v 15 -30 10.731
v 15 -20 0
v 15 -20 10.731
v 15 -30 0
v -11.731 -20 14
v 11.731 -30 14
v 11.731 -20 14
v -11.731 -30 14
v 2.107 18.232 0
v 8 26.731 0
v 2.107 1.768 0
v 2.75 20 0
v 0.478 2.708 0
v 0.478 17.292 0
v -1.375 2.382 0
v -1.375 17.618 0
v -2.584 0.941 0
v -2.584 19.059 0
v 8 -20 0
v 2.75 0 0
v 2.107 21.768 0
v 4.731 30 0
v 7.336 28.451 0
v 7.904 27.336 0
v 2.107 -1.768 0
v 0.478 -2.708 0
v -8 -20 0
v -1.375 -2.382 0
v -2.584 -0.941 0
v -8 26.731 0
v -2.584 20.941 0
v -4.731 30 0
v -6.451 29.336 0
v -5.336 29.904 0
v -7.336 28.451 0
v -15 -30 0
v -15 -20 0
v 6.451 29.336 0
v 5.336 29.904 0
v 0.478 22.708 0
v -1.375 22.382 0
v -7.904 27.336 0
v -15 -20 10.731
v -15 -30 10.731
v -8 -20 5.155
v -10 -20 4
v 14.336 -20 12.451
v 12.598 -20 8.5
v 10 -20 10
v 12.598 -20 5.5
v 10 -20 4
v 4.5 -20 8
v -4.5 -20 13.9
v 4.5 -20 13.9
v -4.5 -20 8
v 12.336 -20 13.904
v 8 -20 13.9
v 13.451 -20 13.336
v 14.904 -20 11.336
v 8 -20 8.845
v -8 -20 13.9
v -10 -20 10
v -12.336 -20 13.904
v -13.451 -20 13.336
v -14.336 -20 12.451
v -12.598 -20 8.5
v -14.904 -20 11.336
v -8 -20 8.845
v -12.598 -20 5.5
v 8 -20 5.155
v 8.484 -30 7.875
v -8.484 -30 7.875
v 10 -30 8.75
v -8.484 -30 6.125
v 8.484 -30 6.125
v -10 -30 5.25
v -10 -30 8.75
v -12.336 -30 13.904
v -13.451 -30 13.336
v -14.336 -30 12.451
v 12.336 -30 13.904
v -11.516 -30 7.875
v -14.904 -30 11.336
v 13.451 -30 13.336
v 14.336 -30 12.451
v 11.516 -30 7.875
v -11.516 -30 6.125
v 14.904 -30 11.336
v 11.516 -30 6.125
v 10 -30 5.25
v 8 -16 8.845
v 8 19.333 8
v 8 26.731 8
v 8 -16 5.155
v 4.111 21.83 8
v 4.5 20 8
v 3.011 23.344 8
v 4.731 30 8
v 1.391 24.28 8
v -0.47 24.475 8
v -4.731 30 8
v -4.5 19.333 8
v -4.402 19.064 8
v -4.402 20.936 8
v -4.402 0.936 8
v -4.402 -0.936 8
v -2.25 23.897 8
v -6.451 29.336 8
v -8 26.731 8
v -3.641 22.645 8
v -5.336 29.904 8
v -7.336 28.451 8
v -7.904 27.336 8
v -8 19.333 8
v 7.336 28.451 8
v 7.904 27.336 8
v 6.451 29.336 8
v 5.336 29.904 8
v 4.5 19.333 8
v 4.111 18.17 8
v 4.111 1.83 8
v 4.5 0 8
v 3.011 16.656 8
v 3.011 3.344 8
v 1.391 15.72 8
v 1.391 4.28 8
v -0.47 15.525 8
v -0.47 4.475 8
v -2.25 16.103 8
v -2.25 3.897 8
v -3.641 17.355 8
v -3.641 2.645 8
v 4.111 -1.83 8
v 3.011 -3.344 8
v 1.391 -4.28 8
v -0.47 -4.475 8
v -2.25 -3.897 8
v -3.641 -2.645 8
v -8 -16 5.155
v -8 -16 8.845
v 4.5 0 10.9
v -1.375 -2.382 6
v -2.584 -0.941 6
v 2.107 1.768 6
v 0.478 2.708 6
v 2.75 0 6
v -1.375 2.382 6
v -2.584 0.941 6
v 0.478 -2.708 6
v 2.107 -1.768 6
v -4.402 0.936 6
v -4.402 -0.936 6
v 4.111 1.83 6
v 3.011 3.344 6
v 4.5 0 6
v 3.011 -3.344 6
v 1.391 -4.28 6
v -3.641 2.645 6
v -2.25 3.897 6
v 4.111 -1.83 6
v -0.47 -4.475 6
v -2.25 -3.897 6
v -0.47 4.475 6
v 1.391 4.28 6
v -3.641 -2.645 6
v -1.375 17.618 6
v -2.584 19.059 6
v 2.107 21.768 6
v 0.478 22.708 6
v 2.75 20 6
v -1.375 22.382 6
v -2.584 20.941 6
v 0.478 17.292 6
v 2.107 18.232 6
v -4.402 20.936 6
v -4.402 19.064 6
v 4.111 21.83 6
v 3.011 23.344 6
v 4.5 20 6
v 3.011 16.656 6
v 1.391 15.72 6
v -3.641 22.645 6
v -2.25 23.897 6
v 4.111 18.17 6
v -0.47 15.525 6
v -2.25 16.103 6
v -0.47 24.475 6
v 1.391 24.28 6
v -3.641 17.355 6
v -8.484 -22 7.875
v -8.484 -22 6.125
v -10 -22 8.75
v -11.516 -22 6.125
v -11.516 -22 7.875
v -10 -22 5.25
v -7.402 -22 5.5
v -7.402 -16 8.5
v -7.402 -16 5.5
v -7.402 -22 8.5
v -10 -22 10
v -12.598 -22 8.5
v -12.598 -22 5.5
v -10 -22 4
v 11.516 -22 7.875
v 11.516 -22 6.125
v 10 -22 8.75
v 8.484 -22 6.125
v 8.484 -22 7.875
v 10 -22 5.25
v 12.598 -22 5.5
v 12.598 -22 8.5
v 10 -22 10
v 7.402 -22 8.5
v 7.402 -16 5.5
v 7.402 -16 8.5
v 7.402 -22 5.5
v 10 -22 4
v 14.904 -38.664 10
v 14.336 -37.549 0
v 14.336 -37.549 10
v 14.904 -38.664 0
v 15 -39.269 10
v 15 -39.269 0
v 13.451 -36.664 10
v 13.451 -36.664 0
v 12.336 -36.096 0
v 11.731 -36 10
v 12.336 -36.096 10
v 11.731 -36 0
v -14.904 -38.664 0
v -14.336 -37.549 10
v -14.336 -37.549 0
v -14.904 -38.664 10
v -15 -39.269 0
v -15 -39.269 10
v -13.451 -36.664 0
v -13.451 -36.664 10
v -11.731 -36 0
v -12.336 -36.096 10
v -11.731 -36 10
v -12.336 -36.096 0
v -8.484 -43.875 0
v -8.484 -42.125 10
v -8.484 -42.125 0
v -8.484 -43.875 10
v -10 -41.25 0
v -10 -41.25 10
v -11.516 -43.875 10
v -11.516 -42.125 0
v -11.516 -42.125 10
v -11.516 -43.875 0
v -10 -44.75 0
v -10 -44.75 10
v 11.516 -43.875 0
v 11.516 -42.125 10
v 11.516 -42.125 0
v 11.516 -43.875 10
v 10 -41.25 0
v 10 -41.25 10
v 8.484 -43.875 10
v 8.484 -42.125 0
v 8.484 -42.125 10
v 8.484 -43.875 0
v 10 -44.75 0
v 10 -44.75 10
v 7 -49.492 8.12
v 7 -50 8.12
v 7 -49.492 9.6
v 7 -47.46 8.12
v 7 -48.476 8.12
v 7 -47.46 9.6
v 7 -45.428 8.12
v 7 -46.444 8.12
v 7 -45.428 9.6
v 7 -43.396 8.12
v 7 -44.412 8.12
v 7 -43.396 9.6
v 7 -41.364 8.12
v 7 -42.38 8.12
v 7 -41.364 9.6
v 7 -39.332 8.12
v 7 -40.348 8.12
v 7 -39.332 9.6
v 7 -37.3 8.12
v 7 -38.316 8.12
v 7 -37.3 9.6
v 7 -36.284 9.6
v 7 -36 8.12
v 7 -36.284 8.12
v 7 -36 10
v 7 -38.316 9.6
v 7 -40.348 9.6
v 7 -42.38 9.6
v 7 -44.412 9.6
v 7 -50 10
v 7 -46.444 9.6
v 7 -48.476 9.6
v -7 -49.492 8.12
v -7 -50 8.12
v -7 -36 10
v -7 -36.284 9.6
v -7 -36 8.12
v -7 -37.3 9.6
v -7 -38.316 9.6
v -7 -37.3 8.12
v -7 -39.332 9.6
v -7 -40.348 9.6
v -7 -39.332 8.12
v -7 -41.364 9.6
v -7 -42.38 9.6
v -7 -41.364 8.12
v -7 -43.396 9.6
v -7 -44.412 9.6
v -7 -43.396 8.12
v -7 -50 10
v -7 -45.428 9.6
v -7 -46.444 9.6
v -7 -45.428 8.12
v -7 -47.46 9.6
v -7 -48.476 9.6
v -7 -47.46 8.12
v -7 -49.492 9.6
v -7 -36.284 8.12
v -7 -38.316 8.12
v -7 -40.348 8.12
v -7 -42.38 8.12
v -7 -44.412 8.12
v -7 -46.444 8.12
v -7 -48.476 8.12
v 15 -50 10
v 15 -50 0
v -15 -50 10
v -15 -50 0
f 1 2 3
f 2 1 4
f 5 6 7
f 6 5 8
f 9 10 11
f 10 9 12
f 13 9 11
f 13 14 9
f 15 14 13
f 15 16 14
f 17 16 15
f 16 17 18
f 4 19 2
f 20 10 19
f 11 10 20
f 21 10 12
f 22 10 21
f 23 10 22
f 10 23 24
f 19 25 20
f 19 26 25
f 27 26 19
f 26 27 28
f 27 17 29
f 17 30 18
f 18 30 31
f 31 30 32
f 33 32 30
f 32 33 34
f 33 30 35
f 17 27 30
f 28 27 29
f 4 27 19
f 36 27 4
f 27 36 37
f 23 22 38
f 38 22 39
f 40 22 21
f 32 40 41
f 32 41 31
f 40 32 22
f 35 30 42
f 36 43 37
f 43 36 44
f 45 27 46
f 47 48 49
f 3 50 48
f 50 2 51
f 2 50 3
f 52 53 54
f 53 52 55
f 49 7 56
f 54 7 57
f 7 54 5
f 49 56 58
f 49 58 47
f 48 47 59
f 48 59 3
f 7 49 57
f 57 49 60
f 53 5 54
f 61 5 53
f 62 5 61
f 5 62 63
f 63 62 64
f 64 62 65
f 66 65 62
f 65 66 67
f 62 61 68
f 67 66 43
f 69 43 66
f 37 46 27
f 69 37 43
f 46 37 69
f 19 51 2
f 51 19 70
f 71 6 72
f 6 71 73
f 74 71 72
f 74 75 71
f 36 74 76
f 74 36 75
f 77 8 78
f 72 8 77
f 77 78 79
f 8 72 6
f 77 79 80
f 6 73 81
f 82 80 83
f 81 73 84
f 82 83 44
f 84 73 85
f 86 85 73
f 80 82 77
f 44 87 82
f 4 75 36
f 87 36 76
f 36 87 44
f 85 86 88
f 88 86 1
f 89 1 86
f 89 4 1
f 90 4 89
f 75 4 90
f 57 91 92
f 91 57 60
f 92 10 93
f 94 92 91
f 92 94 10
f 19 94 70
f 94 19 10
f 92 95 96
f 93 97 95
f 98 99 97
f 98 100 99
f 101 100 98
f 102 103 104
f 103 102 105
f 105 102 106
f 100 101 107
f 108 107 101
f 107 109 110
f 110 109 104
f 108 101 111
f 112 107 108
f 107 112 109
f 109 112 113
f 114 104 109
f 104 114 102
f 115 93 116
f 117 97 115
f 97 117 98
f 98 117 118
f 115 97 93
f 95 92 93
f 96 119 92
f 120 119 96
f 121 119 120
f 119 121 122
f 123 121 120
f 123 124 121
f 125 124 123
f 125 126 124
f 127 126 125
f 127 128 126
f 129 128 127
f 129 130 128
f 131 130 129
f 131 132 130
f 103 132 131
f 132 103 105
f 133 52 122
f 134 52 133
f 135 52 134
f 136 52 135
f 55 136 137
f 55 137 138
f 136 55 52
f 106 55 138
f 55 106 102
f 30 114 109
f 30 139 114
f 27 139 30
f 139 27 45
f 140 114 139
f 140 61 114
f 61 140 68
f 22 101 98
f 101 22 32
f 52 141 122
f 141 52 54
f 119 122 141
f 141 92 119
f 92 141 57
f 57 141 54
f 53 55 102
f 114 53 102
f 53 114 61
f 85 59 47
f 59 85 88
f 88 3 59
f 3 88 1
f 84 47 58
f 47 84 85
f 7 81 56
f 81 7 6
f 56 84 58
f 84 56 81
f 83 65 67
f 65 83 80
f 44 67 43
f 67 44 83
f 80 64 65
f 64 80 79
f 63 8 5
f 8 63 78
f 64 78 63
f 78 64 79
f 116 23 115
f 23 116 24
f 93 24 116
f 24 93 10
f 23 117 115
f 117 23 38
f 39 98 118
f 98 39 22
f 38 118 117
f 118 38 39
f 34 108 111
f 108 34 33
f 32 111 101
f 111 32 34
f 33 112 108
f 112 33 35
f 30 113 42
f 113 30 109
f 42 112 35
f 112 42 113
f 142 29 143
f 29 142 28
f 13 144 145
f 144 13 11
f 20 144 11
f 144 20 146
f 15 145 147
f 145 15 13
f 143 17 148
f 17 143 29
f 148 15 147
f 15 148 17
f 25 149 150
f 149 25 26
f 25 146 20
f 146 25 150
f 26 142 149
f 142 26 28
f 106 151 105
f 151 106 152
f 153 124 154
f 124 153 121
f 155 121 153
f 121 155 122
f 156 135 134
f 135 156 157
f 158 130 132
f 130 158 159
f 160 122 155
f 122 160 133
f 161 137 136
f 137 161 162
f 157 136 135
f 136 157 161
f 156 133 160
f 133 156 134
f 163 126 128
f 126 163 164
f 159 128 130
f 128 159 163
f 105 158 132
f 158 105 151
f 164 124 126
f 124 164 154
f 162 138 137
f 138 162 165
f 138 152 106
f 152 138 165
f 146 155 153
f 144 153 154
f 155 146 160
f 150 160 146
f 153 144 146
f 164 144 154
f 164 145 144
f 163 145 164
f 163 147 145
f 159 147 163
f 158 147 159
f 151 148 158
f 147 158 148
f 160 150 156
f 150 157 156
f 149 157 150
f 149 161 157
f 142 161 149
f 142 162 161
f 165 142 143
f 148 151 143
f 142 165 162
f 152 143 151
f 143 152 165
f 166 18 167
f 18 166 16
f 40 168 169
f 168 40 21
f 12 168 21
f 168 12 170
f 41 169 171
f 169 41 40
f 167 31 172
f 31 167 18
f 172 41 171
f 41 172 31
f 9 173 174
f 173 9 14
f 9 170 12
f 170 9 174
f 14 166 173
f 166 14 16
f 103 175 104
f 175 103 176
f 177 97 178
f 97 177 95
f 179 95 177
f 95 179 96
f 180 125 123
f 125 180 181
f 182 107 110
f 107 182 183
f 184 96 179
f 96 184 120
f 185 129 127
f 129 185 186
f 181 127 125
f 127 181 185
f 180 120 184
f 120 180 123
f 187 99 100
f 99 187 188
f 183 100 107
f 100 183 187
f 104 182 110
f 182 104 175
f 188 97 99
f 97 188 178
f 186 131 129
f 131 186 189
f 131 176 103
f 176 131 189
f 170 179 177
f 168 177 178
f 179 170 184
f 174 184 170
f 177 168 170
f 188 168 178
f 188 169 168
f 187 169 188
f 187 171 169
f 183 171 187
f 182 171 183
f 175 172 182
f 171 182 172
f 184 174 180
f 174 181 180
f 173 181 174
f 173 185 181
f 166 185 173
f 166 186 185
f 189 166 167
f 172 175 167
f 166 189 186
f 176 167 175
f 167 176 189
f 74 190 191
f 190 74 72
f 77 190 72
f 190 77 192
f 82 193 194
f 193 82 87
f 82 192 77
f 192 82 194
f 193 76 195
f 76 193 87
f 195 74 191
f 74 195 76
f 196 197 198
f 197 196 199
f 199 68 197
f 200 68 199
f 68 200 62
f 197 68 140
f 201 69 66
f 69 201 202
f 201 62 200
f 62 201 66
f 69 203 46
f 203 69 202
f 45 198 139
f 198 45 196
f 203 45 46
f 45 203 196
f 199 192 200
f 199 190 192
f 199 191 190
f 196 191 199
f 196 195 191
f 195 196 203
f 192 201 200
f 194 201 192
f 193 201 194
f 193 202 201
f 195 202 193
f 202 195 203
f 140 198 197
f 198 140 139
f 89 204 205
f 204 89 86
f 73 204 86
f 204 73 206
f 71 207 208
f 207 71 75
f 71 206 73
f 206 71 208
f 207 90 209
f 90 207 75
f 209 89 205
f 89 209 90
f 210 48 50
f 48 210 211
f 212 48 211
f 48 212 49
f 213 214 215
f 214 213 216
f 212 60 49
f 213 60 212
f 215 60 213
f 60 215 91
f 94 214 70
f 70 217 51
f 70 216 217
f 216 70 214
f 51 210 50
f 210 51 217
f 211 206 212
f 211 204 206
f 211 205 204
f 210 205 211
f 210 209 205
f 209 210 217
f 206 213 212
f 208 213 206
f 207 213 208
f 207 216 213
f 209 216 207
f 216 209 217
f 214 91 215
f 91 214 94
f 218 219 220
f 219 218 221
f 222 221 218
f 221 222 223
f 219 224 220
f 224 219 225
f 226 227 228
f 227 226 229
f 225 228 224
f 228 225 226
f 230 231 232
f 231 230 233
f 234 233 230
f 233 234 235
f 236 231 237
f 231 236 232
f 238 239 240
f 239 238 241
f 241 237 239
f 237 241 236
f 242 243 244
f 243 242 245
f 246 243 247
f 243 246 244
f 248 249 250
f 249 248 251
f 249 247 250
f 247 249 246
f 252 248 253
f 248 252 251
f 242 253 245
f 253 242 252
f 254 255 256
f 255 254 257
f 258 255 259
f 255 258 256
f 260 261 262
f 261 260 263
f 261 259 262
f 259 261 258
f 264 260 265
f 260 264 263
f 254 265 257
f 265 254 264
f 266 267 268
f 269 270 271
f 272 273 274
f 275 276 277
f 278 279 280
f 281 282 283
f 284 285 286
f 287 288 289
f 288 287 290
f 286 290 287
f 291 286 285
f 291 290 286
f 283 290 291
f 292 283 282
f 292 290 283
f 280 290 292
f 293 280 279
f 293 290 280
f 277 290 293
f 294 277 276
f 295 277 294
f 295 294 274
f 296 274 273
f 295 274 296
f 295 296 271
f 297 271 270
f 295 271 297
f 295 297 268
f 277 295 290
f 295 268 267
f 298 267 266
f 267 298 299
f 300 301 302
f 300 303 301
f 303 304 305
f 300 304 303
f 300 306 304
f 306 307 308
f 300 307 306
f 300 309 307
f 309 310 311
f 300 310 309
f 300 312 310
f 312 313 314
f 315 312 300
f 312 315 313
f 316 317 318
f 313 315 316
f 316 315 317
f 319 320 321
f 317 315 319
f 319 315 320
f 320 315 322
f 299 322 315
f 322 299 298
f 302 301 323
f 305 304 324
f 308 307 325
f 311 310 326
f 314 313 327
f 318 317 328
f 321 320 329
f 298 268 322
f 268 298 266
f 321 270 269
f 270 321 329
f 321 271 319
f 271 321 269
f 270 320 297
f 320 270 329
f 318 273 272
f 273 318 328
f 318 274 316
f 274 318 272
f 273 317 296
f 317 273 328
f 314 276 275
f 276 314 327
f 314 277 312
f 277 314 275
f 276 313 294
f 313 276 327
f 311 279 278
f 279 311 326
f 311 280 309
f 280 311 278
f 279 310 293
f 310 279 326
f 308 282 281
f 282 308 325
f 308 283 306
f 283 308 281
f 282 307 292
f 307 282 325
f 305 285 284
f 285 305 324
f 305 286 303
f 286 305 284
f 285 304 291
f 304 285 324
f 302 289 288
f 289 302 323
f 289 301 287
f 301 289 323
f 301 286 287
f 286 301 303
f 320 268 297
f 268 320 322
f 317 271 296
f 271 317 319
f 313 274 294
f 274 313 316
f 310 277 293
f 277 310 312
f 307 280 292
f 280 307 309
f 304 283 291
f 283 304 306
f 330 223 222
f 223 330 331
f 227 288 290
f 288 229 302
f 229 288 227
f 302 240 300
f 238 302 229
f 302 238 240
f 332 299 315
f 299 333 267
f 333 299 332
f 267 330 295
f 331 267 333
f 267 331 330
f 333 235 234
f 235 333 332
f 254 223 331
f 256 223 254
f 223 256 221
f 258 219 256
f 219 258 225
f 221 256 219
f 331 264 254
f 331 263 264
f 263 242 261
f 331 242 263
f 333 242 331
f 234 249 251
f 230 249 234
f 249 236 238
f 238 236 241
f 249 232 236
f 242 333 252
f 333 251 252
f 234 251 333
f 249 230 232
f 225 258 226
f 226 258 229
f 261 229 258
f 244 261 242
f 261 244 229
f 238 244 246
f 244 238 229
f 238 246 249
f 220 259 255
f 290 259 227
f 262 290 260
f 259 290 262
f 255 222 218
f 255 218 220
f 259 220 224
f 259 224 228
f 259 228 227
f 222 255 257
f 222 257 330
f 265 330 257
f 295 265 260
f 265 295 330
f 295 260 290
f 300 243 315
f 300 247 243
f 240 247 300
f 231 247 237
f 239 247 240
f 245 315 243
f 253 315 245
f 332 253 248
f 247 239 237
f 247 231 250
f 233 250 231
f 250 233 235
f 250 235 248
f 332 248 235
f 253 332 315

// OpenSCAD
// This printed part is one possible way to anchor Shapeoko belts.
// See http://www.shapeoko.com/wiki/index.php/Belt_Anchors for other ideas.
// Motivated by http://www.thingiverse.com/thing:33881 not being strong enough
// when I initially printed it.

// Upright: printed, but not stress tested, looks sturdy
// Top: completely untested

gThick = 8;
gRibHeight = 6;
gTopRoundoverRadius = 4;
gSideRoundoverRadius = 4;
gMainWidth = 16;
gTopWidth = 30;
gRibWidth = 3.5;
gHoleSpacing = 20;
gBeltWide = 14; // 1/4" belt + slop
gBeltPitch = 2.032; // MXL in mm
gBeltThick = 1.5;
e = 0.02;

// screw_clearance_diameter, socket_head_clearance_diameter, nut outside diameter
// TODO untested numbers, these should move to a common include.
M3 = [3.5, 6, 6];
M5 = [5.5, 9, 9];
M8 = [8, 13, 13];

module InsetHole(x) {
  d = x[0];
  socket_head = x[1];
  union() {
    translate([0,0,-50]) cylinder(r=d/2, h=100);
    cylinder(r=socket_head/2, h=10);
  }
}

module NutHole(x) {
  d = x[0];
  nut_size = x[2];
  union() {
    translate([0,0,1]) cylinder(r=d/2, h=50);
    cylinder(r=nut_size/2, $fn=6, h=6);
  }
}

module Rib(t=4) {
  translate([-t/2,0,-0.1])
    rotate([90,0,90])
      linear_extrude(height=t)
        polygon(points=[[0,0],[40,0],[0,gRibHeight]],paths=[[0,1,2]]);
}

module Roundover(r) {
  translate([0.1,0.1,-50])
    difference() {
      cube([r,r,100]);
      translate([0,0,-1]) cylinder(r=r,h=102,$fn=20);
    }
}

module Upright() {
  difference() {
    union() {
      // body, for now (until beziers work)
      translate([0,-25,(gThick+gRibHeight)/2]) cube([gTopWidth,10,gThick+gRibHeight], center=true);
      translate([0,0,gThick/2]) cube([gMainWidth,60,gThick], center=true);
      // ribs
      translate([(gMainWidth-gRibWidth)/2,-20,gThick]) Rib(t=gRibWidth);
      translate([-(gMainWidth-gRibWidth)/2,-20,gThick]) Rib(t=gRibWidth);
    }
    // Chamfer top edges
    // TODO make these translation numbers constants as well, and fix Roundover's
    // origin.
    translate([gTopWidth/2-gTopRoundoverRadius,0,gThick+gRibHeight-gTopRoundoverRadius])
      rotate([90,0,0])
        Roundover(r=gTopRoundoverRadius);
    translate([-(gTopWidth/2-gTopRoundoverRadius),0,gThick+gRibHeight-gTopRoundoverRadius])
      rotate([90,0,180])
        Roundover(r=gTopRoundoverRadius);
    // Chamfer edges near bottom mounting hole
    translate([gMainWidth/2-gSideRoundoverRadius,26,0])
      Roundover(r=gSideRoundoverRadius);
    translate([-(gMainWidth/2-gSideRoundoverRadius),26,0])
      rotate([0,0,90])
        Roundover(r=gSideRoundoverRadius);
    // M5 mounting holes
    translate([0,0,gThick-2]) InsetHole(M5);
    translate([0,20,gThick-2]) InsetHole(M5);
    // M3 nut traps (20mm spacing, for compat with old part)
    translate([-gHoleSpacing/2,-16,(gThick+gRibHeight)/2]) rotate([90,-90,0]) NutHole(M3);
    translate([gHoleSpacing/2,-16,(gThick+gRibHeight)/2]) rotate([90,-90,0]) NutHole(M3);
  }
}

module Belt() {
  translate([0,0,gBeltThick/2]) cube([gBeltWide,30,gBeltThick], center=true);
  for(i = [0:30/gBeltPitch]) {
    translate([0,i * gBeltPitch,-gBeltThick/2+e]) cube([gBeltWide,gBeltPitch / 2,gBeltThick], center=true);
  }
}

module Top() {
  rotate([-90,0,0]) difference() {
    translate([0,-5,(gThick+gRibHeight)/2]) cube([gTopWidth,10,gThick+gRibHeight], center=true);
    // holes
    translate([-gHoleSpacing/2,20,(gThick+gRibHeight)/2]) rotate([90,-90,0]) NutHole(M3);
    translate([gHoleSpacing/2,20,(gThick+gRibHeight)/2]) rotate([90,-90,0]) NutHole(M3);
    // chamfer
    translate([gTopWidth/2-gTopRoundoverRadius,0,gThick+gRibHeight-gTopRoundoverRadius])
      rotate([90,0,0])
        Roundover(r=gTopRoundoverRadius);
    translate([-(gTopWidth/2-gTopRoundoverRadius),0,gThick+gRibHeight-gTopRoundoverRadius])
      rotate([90,0,180])
        Roundover(r=gTopRoundoverRadius);
    // TODO remove 12 as magic number
    translate([0,-12+(1.6*gBeltThick),0]) rotate([90,0,0]) Belt();
  }
}

union() {
  Upright();
  translate([0,-50,0]) Top();
}
